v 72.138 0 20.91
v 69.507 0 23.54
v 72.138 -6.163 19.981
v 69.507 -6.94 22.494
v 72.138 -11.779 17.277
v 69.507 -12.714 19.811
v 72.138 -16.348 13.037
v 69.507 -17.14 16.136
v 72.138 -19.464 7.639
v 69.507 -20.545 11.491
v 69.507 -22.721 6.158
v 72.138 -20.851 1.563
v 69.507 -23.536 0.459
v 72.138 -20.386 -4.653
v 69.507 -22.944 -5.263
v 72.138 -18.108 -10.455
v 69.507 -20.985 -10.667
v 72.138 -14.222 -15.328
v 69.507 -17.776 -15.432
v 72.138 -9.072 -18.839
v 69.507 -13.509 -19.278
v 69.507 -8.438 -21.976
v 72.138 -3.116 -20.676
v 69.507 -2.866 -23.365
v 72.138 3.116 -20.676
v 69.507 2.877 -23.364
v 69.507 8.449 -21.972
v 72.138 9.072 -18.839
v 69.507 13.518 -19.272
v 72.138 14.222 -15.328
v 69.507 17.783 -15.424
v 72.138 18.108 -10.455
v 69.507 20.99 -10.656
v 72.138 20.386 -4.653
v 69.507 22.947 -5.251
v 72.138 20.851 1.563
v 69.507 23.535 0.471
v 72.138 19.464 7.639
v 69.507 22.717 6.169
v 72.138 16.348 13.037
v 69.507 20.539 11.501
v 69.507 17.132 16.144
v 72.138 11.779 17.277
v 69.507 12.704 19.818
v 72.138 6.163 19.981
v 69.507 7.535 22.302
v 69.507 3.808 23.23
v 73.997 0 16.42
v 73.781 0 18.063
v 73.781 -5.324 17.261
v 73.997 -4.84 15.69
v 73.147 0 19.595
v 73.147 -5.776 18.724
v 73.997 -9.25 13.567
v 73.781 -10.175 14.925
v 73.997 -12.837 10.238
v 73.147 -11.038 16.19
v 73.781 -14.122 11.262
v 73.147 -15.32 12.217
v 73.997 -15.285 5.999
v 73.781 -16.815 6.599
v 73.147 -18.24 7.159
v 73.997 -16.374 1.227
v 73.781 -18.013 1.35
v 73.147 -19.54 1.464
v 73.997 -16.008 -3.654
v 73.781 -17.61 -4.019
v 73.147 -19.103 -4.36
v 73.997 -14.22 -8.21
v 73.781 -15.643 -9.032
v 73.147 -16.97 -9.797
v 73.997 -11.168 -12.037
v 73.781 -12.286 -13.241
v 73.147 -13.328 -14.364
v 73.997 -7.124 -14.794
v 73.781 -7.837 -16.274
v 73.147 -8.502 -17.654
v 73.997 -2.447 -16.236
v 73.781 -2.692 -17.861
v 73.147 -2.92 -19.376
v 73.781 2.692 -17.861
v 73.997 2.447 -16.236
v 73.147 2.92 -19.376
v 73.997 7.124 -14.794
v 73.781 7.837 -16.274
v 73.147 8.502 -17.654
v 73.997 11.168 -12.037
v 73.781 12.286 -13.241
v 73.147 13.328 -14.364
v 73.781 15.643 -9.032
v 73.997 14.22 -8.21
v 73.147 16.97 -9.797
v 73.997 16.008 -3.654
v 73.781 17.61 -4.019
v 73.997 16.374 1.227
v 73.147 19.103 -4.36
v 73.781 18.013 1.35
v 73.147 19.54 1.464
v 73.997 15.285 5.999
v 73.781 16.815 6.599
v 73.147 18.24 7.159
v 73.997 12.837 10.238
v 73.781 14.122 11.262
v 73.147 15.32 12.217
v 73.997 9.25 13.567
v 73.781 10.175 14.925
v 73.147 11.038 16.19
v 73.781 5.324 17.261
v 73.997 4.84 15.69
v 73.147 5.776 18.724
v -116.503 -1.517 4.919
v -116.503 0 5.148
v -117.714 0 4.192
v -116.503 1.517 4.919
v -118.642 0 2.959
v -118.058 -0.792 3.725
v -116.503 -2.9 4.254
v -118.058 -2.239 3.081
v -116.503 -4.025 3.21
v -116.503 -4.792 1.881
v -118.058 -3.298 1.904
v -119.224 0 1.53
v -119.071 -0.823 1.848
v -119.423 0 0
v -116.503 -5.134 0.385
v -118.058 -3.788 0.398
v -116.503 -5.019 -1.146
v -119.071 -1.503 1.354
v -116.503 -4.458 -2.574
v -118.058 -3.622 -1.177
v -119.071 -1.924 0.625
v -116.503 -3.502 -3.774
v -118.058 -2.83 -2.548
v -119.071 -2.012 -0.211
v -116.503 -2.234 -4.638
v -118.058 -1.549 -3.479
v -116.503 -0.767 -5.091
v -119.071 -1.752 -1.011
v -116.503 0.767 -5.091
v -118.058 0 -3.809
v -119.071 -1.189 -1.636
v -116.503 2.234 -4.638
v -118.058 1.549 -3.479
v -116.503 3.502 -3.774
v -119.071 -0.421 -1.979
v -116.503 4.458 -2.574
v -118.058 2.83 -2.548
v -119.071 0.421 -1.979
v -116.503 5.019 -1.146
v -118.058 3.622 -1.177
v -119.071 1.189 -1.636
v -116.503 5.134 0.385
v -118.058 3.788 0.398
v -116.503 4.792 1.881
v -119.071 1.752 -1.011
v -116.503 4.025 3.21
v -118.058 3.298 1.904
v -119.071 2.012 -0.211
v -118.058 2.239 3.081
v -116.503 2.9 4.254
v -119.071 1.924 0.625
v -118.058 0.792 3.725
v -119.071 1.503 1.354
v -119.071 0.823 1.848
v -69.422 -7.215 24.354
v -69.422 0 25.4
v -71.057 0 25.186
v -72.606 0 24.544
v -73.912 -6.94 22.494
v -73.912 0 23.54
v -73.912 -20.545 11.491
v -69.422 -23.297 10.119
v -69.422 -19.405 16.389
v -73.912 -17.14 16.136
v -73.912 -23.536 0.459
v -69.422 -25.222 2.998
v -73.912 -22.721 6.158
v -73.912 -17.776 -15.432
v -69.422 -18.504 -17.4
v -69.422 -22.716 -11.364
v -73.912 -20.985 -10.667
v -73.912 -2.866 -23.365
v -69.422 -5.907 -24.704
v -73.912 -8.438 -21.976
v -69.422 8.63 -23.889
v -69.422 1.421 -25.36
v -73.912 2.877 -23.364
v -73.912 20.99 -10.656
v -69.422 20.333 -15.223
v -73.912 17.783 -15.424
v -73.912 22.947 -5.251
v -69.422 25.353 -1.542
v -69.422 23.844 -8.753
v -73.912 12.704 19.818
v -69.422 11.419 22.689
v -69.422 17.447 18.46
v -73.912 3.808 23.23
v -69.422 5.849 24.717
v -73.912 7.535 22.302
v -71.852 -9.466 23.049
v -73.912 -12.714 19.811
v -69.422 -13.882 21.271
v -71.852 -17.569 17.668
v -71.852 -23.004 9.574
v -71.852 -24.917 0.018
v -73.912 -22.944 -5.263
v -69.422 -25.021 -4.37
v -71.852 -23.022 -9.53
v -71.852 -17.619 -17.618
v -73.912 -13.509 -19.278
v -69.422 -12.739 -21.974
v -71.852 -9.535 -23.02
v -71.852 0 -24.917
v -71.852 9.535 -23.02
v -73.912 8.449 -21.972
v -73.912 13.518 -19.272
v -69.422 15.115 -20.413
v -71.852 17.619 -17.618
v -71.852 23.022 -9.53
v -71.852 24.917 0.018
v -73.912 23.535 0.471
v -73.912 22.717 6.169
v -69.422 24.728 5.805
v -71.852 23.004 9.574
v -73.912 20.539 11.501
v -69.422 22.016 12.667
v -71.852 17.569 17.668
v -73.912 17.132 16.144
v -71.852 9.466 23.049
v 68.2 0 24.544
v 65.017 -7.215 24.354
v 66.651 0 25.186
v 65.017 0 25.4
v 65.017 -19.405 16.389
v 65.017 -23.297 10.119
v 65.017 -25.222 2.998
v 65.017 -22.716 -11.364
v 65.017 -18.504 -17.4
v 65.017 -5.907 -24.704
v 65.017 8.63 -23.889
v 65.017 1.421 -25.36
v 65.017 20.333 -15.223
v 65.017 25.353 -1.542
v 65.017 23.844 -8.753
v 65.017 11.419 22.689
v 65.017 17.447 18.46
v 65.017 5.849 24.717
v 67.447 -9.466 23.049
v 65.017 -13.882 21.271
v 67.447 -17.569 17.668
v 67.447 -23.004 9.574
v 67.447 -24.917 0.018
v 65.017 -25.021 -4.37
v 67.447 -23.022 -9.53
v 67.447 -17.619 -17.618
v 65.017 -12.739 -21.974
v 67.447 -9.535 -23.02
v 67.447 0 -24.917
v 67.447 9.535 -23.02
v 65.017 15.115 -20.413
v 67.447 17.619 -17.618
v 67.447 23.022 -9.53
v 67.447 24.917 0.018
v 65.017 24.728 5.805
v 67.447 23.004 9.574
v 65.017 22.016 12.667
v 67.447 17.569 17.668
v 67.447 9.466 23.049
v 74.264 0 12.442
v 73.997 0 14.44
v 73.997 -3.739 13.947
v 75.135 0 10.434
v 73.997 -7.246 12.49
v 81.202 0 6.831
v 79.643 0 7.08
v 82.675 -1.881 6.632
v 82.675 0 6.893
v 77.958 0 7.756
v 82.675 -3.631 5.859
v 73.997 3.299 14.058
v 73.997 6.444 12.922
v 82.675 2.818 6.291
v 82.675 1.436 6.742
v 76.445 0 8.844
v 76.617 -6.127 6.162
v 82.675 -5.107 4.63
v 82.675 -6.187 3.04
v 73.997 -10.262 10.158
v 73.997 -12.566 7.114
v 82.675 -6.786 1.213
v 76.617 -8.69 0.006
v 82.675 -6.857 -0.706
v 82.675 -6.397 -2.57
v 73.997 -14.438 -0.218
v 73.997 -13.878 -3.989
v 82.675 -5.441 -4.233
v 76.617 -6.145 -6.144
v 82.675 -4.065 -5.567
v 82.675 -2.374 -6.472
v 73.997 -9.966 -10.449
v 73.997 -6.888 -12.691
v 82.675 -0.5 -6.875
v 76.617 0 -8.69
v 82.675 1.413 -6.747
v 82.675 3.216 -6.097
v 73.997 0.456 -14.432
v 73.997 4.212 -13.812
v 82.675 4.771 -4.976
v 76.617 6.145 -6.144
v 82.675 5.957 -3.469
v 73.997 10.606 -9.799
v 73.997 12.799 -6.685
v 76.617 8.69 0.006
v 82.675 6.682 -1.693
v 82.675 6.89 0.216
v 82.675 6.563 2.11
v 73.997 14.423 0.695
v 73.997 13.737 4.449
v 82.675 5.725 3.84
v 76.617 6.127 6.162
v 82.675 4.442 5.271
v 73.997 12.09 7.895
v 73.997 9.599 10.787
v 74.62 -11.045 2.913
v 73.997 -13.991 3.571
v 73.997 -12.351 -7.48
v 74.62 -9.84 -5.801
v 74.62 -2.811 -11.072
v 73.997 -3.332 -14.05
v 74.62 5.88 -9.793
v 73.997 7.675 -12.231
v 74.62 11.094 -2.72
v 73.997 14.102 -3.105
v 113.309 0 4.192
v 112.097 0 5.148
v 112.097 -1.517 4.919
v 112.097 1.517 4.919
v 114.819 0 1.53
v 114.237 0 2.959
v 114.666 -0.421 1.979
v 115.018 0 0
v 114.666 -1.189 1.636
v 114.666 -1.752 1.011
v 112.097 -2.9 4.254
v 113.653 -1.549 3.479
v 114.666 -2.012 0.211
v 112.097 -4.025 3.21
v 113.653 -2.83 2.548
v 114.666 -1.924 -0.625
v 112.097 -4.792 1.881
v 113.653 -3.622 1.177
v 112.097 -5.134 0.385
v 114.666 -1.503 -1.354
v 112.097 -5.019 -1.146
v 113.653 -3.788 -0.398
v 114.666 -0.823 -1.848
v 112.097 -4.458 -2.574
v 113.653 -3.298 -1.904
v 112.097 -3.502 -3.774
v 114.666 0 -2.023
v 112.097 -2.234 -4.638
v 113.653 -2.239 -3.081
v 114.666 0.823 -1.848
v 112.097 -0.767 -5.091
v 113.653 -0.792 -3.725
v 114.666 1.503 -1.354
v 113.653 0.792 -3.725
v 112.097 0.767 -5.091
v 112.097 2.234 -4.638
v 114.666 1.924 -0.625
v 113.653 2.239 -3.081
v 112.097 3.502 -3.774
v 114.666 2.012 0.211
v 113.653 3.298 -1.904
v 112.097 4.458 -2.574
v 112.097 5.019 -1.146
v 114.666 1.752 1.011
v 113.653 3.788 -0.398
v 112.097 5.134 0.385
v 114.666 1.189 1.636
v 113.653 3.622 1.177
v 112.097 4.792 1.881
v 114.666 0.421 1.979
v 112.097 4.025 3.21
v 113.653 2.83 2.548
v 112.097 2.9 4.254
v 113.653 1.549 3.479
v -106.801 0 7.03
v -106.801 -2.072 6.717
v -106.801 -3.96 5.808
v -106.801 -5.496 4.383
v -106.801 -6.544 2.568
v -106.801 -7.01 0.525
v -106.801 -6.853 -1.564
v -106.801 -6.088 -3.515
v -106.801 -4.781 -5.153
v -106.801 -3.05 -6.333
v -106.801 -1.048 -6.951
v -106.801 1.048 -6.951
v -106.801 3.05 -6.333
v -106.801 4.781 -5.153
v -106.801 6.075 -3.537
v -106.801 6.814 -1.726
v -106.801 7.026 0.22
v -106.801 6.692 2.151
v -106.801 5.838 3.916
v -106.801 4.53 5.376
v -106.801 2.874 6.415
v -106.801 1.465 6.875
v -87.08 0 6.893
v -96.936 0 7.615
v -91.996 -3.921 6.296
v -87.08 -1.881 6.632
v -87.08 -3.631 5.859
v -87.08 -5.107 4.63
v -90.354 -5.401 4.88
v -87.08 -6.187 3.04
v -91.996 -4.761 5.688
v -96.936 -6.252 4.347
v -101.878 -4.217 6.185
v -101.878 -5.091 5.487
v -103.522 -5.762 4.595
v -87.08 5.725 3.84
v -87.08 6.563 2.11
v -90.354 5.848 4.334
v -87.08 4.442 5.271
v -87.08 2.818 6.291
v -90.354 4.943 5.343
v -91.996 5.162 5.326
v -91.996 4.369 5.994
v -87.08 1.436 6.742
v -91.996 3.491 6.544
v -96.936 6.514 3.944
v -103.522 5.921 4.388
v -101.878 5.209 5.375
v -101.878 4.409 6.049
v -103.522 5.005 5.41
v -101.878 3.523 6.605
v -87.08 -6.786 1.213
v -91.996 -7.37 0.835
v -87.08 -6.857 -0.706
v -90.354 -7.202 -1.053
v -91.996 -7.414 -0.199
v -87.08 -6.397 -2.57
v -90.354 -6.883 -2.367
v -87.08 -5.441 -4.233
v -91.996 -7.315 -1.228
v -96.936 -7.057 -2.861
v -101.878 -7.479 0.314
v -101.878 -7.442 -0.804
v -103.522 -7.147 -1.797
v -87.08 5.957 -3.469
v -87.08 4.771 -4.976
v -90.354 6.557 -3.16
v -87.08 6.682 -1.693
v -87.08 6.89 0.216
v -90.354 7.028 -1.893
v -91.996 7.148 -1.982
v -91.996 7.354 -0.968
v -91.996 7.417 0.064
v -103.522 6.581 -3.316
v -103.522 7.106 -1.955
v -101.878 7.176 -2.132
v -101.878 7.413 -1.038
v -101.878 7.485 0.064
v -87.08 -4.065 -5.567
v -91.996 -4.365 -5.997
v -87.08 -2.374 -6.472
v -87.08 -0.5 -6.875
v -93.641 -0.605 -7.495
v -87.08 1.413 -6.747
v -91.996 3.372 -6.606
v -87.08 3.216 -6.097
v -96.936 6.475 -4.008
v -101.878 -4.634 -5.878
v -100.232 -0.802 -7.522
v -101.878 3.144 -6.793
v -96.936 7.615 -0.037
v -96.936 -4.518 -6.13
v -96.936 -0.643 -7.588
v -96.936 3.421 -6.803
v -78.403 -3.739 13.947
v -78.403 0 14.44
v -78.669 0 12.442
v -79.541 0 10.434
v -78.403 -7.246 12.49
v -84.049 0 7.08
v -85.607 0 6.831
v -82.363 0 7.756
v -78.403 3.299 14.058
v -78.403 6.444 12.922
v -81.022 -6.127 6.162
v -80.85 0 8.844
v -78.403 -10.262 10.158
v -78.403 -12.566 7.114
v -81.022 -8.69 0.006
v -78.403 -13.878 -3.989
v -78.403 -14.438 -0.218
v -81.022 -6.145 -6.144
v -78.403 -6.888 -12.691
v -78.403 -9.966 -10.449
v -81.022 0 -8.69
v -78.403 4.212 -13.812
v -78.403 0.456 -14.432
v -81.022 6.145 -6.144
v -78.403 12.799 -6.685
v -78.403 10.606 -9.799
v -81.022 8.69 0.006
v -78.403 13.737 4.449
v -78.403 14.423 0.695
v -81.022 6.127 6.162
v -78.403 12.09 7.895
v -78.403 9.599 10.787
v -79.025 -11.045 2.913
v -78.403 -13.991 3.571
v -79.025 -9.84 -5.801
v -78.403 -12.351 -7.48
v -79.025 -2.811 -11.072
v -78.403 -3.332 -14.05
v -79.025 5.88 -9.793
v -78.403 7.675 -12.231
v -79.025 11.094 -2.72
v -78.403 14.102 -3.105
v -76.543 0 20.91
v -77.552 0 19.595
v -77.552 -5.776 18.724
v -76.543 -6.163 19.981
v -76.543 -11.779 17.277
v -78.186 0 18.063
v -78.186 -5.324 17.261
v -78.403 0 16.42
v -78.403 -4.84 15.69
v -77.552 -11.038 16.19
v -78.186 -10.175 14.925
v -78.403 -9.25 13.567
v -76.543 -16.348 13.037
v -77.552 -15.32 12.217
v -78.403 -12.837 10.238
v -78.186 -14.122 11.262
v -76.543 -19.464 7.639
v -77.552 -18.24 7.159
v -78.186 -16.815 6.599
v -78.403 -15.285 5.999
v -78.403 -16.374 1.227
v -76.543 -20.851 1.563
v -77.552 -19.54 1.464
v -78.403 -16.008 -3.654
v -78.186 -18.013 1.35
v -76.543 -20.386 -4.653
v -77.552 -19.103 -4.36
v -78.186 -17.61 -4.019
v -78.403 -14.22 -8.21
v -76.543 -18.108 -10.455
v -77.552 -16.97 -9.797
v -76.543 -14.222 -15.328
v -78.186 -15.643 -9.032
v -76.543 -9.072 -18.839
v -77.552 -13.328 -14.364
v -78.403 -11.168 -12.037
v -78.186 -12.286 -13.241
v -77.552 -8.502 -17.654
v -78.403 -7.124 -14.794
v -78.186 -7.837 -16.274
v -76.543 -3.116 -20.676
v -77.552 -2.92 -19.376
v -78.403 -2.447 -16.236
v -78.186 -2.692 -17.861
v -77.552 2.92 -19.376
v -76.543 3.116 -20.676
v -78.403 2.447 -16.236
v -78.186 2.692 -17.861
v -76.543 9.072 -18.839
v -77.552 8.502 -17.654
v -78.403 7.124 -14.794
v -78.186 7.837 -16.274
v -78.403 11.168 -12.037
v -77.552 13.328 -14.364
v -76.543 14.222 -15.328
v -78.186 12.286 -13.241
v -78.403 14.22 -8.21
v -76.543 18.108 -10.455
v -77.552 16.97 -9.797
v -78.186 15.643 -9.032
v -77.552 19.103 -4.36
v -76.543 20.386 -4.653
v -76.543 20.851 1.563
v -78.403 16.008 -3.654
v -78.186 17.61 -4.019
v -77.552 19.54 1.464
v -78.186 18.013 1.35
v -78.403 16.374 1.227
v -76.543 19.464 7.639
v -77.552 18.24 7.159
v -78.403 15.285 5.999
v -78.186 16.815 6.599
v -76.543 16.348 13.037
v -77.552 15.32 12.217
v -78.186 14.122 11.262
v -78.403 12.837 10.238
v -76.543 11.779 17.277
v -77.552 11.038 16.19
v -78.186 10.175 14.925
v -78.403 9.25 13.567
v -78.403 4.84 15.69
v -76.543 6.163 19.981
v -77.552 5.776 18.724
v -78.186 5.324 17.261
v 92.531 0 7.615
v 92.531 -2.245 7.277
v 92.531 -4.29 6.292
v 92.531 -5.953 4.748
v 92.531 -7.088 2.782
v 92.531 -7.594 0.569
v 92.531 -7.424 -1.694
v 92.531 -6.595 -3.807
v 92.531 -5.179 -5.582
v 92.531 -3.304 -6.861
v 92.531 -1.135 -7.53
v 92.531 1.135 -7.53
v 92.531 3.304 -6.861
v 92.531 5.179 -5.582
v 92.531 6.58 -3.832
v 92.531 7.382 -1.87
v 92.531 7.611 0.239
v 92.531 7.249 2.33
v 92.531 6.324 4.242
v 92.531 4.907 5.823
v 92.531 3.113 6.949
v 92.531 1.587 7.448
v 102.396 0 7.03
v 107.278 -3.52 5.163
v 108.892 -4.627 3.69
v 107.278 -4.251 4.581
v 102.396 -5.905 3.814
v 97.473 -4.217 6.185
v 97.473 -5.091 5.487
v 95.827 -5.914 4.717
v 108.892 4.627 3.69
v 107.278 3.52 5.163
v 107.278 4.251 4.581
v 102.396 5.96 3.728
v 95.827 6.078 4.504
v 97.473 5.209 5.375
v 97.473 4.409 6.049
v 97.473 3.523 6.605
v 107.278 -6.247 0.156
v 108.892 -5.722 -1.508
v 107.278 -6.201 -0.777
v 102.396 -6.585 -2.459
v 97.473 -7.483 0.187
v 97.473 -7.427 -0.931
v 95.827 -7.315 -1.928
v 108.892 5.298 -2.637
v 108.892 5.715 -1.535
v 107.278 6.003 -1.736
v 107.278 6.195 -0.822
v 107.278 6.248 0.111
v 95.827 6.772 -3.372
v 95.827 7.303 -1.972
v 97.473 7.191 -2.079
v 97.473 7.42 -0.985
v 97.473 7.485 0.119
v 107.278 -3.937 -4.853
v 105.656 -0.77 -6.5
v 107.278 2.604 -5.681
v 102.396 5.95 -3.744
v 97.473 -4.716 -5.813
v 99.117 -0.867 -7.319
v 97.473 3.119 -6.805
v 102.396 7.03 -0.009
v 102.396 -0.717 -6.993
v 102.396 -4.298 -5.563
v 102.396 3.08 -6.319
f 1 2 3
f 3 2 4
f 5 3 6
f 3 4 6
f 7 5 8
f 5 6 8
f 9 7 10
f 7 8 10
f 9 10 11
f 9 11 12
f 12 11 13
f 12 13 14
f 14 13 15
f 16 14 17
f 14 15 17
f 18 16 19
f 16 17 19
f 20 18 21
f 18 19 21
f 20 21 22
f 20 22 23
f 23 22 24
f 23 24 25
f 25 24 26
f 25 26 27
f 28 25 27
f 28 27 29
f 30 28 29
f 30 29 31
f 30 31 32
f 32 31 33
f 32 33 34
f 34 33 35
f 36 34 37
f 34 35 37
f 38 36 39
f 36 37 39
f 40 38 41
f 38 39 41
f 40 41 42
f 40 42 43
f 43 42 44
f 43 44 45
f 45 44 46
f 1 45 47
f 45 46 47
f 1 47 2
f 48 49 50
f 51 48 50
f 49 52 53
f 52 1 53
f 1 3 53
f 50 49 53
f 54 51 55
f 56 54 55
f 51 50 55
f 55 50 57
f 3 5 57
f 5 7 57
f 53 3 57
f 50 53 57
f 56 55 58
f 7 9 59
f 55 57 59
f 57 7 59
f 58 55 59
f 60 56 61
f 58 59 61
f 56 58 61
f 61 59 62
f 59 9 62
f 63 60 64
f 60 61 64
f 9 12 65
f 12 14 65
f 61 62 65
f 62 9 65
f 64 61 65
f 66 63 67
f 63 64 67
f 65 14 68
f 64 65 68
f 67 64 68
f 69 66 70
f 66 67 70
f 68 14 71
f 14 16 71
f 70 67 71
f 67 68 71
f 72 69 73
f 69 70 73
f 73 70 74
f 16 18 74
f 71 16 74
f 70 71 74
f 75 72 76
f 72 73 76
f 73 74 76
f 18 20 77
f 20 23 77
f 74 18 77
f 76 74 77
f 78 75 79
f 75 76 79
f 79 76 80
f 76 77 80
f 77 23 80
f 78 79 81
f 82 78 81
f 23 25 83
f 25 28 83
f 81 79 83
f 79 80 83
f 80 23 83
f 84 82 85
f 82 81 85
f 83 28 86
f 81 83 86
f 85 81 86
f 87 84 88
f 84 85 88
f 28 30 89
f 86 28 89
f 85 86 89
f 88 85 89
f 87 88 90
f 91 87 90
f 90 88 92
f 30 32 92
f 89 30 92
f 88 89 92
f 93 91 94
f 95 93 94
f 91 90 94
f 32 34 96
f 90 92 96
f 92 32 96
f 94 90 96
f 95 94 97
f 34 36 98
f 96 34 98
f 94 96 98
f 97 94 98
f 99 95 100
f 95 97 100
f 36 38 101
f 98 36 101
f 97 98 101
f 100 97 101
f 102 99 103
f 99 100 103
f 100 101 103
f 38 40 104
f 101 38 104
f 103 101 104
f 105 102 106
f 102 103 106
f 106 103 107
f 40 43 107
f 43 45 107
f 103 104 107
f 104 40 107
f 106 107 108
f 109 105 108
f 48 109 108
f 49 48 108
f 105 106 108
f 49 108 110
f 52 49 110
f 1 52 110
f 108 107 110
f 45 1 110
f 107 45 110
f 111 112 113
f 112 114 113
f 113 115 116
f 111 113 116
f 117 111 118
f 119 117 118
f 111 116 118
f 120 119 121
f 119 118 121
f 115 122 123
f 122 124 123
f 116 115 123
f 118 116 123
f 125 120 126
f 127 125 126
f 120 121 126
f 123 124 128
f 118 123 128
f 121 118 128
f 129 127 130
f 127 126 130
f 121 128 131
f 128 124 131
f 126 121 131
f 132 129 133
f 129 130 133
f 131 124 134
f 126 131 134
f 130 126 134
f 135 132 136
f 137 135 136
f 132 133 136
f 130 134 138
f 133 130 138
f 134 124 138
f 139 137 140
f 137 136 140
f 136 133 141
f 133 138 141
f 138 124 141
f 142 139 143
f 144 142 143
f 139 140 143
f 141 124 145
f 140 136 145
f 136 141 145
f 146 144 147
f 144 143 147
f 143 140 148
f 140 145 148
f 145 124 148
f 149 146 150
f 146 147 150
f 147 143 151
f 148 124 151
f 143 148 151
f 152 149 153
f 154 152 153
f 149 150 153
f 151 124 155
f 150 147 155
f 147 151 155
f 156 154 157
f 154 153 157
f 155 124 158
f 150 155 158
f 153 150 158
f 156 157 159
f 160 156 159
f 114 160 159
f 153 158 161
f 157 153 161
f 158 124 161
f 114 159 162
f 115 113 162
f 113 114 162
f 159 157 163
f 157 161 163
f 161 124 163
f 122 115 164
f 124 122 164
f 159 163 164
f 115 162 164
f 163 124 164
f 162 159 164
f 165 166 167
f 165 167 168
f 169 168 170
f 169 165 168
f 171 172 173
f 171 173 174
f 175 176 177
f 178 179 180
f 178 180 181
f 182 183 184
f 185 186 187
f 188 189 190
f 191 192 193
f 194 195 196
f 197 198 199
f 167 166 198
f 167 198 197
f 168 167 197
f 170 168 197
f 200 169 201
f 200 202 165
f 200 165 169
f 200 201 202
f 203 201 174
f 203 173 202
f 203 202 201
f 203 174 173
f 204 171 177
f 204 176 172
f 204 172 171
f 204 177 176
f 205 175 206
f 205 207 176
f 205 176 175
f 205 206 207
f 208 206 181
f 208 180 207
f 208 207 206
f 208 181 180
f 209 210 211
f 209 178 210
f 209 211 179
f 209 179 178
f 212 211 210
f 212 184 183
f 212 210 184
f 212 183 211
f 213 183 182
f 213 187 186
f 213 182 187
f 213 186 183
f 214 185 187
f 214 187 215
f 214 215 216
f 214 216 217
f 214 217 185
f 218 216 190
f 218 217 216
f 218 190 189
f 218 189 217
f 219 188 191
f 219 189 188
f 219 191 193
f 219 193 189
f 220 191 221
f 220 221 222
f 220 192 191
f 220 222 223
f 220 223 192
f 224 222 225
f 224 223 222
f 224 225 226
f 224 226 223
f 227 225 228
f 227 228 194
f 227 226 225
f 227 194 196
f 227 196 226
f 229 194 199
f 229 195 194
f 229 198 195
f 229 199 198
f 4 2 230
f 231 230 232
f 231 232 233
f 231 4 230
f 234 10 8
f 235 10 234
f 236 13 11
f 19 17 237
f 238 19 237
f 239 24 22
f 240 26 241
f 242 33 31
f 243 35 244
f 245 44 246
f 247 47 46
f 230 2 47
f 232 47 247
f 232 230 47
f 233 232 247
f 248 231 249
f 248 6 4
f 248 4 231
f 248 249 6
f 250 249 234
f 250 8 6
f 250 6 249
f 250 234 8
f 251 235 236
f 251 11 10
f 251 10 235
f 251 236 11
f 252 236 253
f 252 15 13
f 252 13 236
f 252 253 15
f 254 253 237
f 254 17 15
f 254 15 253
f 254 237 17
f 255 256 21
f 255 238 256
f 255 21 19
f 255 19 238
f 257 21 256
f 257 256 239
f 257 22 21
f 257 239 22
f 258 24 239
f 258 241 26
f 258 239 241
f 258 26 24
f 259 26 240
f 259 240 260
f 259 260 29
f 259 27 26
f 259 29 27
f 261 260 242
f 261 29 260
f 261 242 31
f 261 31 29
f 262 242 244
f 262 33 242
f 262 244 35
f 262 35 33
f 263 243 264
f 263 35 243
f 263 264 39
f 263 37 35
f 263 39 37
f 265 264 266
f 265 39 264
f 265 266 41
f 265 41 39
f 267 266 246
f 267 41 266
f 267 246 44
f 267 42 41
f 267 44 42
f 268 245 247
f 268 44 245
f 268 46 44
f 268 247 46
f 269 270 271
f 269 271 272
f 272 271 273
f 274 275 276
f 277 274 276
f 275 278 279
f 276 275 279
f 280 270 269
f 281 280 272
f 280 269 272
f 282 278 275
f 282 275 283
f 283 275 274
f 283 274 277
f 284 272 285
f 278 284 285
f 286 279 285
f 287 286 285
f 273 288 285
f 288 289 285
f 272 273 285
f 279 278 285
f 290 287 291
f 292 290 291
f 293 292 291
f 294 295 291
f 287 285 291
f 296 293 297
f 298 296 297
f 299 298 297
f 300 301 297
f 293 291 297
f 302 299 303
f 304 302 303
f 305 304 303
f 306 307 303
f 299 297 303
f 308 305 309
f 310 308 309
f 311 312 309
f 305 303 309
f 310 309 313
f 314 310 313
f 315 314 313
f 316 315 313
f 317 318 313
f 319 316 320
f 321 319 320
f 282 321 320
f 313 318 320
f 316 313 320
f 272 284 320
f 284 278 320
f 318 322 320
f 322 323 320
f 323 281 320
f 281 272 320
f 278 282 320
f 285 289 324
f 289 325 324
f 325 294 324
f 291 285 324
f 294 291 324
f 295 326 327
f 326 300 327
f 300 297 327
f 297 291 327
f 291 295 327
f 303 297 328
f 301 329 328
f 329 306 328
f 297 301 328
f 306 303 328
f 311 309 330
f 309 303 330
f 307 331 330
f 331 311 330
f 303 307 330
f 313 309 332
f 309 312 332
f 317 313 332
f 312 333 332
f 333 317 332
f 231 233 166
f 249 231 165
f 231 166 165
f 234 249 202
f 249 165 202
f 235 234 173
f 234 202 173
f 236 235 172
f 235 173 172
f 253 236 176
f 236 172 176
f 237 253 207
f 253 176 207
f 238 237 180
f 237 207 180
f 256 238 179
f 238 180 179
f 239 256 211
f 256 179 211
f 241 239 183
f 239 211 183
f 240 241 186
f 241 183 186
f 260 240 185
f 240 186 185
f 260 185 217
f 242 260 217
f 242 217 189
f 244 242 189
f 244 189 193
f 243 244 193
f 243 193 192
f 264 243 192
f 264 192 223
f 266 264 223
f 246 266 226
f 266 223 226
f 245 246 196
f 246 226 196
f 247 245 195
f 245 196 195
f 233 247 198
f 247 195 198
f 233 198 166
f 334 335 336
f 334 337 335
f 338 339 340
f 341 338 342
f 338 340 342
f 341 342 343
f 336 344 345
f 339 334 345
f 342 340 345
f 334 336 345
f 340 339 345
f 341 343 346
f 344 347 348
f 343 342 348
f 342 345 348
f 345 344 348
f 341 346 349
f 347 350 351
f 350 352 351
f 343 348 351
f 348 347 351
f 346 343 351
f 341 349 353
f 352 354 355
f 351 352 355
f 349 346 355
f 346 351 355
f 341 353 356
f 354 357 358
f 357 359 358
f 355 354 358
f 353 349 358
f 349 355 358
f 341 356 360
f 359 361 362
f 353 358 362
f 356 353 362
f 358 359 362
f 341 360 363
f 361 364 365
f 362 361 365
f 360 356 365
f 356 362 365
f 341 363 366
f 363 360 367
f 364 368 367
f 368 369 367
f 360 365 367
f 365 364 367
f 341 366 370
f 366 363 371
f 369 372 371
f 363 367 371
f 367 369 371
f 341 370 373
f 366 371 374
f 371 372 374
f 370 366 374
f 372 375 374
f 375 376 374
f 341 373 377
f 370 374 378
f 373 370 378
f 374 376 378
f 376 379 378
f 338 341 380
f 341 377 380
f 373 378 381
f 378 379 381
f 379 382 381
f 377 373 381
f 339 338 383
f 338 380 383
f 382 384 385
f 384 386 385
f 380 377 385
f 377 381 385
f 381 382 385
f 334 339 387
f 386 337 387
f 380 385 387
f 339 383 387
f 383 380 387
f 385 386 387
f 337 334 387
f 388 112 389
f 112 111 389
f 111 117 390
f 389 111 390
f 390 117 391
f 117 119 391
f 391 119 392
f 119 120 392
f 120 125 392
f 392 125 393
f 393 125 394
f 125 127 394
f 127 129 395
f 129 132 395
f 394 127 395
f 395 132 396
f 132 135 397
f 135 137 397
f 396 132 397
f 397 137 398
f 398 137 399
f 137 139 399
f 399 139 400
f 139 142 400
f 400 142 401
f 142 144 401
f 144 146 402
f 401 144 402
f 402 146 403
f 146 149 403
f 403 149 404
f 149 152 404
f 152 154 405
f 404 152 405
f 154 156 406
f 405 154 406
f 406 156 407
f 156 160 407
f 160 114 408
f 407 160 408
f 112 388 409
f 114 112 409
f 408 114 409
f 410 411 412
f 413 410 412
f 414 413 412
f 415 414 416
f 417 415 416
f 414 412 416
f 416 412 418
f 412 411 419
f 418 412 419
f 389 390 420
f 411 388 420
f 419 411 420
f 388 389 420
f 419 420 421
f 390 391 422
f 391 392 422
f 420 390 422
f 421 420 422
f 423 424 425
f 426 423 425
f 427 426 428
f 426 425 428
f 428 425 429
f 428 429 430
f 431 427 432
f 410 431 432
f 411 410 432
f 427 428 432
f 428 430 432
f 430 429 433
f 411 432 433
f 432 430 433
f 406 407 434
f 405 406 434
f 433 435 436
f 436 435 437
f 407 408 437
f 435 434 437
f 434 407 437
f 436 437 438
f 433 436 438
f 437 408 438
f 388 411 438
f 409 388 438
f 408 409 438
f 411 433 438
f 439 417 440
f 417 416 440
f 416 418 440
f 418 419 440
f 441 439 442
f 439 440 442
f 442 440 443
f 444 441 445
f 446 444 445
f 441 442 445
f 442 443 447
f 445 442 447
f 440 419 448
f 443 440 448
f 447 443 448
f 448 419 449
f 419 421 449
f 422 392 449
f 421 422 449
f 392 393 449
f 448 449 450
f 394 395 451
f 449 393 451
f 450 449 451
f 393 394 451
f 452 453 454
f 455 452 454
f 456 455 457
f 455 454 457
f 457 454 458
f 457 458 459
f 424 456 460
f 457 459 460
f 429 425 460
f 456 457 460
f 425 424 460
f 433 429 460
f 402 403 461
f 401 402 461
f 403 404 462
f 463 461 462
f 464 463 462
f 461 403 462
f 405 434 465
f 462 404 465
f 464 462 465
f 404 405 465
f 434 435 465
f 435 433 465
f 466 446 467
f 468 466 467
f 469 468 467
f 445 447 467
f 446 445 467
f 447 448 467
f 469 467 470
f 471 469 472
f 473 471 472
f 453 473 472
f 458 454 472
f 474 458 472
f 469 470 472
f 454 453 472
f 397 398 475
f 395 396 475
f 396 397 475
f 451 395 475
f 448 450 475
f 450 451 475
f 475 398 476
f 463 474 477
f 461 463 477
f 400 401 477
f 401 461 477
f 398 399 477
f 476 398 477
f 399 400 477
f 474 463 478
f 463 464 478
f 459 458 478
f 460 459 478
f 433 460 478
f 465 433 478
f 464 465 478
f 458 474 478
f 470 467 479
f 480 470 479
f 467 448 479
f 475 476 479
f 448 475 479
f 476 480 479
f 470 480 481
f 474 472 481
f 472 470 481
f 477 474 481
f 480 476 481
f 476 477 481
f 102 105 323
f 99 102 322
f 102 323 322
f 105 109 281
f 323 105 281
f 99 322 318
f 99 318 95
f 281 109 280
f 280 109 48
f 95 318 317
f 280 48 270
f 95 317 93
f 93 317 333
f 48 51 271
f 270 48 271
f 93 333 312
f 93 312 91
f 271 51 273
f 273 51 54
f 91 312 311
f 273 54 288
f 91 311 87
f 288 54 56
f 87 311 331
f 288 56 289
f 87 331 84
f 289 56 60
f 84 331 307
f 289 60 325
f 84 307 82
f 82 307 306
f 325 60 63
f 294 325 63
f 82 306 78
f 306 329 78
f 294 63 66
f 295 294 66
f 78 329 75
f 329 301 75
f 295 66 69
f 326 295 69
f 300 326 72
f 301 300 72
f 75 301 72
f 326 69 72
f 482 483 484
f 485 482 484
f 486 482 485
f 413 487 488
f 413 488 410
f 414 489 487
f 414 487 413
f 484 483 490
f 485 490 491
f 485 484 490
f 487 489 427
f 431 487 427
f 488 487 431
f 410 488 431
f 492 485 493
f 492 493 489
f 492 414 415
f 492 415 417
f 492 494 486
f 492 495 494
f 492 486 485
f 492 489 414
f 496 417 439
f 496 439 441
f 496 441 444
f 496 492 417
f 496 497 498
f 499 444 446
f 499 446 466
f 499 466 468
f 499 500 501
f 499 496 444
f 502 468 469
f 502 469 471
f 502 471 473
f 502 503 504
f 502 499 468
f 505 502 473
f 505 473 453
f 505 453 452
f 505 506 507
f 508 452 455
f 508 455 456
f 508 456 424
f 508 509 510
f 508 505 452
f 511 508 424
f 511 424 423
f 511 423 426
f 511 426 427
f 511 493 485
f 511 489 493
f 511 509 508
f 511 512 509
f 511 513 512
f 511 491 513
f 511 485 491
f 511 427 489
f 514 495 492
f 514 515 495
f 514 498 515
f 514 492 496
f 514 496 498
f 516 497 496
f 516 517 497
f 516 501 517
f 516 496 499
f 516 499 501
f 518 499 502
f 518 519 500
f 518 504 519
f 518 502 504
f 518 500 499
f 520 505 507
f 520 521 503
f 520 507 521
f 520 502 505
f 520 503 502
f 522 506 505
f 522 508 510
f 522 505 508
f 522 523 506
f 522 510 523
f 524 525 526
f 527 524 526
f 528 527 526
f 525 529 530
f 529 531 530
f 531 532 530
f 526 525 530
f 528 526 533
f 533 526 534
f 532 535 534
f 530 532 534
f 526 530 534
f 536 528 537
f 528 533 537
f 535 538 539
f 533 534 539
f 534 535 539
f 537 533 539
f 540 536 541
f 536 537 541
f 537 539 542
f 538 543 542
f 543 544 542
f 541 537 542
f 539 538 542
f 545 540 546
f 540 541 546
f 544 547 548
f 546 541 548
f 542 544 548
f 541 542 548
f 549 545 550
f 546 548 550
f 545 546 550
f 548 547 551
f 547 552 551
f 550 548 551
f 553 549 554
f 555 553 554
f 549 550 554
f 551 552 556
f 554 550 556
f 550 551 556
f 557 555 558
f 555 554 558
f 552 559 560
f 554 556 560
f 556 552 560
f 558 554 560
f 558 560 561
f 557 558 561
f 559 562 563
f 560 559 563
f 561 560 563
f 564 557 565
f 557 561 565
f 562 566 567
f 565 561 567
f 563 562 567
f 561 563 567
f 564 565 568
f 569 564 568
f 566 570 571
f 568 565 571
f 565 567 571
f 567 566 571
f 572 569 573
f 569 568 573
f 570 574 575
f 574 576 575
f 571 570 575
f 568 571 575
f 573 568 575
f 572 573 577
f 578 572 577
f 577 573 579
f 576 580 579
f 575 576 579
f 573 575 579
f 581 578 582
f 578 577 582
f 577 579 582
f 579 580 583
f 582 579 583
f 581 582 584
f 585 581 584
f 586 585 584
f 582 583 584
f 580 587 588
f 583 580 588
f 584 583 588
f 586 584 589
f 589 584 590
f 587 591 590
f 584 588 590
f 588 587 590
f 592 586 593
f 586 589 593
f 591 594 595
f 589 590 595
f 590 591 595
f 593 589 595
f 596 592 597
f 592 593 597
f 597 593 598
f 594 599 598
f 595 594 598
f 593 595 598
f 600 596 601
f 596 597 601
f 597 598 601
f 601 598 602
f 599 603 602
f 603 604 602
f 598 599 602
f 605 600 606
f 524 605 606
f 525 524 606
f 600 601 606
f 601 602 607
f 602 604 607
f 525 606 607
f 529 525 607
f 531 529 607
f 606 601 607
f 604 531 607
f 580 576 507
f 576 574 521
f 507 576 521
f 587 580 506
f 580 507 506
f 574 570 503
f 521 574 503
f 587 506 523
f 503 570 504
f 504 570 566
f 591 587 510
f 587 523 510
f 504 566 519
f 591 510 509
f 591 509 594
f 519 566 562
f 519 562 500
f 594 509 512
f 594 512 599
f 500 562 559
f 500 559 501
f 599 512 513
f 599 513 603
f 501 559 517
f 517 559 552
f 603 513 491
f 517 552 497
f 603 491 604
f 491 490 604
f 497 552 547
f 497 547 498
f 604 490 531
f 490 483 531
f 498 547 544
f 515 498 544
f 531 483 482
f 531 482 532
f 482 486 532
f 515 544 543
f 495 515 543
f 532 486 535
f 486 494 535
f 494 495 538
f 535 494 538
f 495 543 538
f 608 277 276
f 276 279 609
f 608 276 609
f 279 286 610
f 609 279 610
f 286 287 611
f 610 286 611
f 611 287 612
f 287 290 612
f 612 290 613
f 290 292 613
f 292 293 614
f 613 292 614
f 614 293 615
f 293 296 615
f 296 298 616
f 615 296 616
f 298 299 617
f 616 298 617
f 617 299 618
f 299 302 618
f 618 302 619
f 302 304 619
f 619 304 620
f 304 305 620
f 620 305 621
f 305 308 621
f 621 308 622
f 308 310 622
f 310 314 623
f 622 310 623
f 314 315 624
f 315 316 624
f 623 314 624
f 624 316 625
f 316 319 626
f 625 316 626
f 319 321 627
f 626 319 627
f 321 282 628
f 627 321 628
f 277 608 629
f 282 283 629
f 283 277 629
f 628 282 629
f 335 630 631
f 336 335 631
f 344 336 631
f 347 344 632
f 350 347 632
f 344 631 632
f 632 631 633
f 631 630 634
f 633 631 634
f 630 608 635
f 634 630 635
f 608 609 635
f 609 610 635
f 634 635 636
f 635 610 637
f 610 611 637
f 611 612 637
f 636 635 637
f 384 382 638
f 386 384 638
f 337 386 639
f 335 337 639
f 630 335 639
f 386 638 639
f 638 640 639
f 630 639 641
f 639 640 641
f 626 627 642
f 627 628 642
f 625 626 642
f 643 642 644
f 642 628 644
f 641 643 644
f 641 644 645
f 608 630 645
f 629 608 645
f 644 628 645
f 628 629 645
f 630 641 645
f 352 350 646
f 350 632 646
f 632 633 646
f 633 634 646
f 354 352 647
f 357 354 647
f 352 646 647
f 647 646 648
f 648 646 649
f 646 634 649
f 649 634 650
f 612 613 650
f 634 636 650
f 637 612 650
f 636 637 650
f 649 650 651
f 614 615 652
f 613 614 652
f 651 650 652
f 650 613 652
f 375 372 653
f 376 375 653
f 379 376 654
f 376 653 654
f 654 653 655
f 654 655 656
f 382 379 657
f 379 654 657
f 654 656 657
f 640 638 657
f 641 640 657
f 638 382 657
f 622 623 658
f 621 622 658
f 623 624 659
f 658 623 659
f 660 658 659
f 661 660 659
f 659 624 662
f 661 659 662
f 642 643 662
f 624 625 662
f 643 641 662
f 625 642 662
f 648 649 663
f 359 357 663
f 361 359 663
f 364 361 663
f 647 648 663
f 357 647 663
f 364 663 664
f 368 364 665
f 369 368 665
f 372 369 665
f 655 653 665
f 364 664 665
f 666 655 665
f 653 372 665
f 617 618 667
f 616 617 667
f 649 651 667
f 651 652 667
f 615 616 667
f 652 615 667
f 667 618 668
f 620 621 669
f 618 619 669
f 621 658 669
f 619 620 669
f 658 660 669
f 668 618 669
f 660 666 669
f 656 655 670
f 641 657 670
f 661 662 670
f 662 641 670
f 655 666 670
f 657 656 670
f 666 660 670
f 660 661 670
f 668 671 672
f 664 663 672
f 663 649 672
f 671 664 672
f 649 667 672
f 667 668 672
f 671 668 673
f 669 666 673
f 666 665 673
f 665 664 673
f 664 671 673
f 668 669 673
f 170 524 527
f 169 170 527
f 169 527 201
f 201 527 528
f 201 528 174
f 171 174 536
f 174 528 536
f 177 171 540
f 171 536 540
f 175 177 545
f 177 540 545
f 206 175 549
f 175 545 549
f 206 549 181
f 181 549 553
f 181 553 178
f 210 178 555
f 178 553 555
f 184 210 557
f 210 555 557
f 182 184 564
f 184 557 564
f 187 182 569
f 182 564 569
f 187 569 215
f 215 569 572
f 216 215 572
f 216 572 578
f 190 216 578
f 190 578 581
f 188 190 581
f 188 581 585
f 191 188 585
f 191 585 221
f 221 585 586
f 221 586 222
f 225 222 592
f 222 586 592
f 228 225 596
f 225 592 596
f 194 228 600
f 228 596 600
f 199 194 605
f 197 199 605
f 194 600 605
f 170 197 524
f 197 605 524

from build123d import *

# Parameters (mm, degrees)
F2_SIZE = 6.35
F3_R    = 6.35
F4_R    = 7.62


with BuildPart() as f1:
    # F0 (on Front) → F1 (revolve)
    with BuildSketch(Plane.XZ):
        with BuildLine():
            Line((-113.4249120951, 0), (-78.4026022691, 0))
            Line((-78.4026022691, 0), (73.9973977309, 0))
            Line((73.9973977309, 0), (109.0197075568, 0))
            Line((109.0197075568, 0), (115.0176400335, 0))
            ThreePointArc((115.0176400335, 0), (114.2367455979, 2.9593425069), (112.0973977309, 5.1481081173))
            ThreePointArc((112.0973977309, 5.1481081173), (93.0473977309, 7.6165926694), (73.9973977309, 5.1481081173))
            Line((73.9973977309, 5.1481081173), (73.9973977309, 25.4))
            Line((73.9973977309, 25.4), (-78.4026022691, 25.4))
            Line((-78.4026022691, 25.4), (-78.4026022691, 5.1481081173))
            ThreePointArc((-78.4026022691, 5.1481081173), (-97.4526022691, 7.6165926694), (-116.5026022691, 5.1481081173))
            ThreePointArc((-116.5026022691, 5.1481081173), (-118.6419501361, 2.9593425069), (-119.4228445717, 0))
            Line((-119.4228445717, 0), (-113.4249120951, 0))
        make_face()
    revolve(axis=Axis((-2.2026022691, 0, 0), (1, 0, 0)))

    # F2
    f2_edges = [f1.edges().sort_by_distance(p)[0] for p in [
        (73.997398, 0, -25.4),
        (-78.402602, 0, -25.4),
    ]]
    chamfer(f2_edges, length=F2_SIZE)

    # F3
    f3_edges = [f1.edges().sort_by_distance(p)[0] for p in [
        (73.997398, 0, -19.05),
        (67.647398, 0, -25.4),
        (-78.402602, 0, -19.05),
        (-72.052602, 0, -25.4),
    ]]
    fillet(f3_edges, radius=F3_R)

    # F4
    f4_edges = [f1.edges().sort_by_distance(p)[0] for p in [
        (73.997398, 0, -5.148108),
        (-78.402602, 0, -5.148108),
    ]]
    fillet(f4_edges, radius=F4_R)


solid = f1.part
